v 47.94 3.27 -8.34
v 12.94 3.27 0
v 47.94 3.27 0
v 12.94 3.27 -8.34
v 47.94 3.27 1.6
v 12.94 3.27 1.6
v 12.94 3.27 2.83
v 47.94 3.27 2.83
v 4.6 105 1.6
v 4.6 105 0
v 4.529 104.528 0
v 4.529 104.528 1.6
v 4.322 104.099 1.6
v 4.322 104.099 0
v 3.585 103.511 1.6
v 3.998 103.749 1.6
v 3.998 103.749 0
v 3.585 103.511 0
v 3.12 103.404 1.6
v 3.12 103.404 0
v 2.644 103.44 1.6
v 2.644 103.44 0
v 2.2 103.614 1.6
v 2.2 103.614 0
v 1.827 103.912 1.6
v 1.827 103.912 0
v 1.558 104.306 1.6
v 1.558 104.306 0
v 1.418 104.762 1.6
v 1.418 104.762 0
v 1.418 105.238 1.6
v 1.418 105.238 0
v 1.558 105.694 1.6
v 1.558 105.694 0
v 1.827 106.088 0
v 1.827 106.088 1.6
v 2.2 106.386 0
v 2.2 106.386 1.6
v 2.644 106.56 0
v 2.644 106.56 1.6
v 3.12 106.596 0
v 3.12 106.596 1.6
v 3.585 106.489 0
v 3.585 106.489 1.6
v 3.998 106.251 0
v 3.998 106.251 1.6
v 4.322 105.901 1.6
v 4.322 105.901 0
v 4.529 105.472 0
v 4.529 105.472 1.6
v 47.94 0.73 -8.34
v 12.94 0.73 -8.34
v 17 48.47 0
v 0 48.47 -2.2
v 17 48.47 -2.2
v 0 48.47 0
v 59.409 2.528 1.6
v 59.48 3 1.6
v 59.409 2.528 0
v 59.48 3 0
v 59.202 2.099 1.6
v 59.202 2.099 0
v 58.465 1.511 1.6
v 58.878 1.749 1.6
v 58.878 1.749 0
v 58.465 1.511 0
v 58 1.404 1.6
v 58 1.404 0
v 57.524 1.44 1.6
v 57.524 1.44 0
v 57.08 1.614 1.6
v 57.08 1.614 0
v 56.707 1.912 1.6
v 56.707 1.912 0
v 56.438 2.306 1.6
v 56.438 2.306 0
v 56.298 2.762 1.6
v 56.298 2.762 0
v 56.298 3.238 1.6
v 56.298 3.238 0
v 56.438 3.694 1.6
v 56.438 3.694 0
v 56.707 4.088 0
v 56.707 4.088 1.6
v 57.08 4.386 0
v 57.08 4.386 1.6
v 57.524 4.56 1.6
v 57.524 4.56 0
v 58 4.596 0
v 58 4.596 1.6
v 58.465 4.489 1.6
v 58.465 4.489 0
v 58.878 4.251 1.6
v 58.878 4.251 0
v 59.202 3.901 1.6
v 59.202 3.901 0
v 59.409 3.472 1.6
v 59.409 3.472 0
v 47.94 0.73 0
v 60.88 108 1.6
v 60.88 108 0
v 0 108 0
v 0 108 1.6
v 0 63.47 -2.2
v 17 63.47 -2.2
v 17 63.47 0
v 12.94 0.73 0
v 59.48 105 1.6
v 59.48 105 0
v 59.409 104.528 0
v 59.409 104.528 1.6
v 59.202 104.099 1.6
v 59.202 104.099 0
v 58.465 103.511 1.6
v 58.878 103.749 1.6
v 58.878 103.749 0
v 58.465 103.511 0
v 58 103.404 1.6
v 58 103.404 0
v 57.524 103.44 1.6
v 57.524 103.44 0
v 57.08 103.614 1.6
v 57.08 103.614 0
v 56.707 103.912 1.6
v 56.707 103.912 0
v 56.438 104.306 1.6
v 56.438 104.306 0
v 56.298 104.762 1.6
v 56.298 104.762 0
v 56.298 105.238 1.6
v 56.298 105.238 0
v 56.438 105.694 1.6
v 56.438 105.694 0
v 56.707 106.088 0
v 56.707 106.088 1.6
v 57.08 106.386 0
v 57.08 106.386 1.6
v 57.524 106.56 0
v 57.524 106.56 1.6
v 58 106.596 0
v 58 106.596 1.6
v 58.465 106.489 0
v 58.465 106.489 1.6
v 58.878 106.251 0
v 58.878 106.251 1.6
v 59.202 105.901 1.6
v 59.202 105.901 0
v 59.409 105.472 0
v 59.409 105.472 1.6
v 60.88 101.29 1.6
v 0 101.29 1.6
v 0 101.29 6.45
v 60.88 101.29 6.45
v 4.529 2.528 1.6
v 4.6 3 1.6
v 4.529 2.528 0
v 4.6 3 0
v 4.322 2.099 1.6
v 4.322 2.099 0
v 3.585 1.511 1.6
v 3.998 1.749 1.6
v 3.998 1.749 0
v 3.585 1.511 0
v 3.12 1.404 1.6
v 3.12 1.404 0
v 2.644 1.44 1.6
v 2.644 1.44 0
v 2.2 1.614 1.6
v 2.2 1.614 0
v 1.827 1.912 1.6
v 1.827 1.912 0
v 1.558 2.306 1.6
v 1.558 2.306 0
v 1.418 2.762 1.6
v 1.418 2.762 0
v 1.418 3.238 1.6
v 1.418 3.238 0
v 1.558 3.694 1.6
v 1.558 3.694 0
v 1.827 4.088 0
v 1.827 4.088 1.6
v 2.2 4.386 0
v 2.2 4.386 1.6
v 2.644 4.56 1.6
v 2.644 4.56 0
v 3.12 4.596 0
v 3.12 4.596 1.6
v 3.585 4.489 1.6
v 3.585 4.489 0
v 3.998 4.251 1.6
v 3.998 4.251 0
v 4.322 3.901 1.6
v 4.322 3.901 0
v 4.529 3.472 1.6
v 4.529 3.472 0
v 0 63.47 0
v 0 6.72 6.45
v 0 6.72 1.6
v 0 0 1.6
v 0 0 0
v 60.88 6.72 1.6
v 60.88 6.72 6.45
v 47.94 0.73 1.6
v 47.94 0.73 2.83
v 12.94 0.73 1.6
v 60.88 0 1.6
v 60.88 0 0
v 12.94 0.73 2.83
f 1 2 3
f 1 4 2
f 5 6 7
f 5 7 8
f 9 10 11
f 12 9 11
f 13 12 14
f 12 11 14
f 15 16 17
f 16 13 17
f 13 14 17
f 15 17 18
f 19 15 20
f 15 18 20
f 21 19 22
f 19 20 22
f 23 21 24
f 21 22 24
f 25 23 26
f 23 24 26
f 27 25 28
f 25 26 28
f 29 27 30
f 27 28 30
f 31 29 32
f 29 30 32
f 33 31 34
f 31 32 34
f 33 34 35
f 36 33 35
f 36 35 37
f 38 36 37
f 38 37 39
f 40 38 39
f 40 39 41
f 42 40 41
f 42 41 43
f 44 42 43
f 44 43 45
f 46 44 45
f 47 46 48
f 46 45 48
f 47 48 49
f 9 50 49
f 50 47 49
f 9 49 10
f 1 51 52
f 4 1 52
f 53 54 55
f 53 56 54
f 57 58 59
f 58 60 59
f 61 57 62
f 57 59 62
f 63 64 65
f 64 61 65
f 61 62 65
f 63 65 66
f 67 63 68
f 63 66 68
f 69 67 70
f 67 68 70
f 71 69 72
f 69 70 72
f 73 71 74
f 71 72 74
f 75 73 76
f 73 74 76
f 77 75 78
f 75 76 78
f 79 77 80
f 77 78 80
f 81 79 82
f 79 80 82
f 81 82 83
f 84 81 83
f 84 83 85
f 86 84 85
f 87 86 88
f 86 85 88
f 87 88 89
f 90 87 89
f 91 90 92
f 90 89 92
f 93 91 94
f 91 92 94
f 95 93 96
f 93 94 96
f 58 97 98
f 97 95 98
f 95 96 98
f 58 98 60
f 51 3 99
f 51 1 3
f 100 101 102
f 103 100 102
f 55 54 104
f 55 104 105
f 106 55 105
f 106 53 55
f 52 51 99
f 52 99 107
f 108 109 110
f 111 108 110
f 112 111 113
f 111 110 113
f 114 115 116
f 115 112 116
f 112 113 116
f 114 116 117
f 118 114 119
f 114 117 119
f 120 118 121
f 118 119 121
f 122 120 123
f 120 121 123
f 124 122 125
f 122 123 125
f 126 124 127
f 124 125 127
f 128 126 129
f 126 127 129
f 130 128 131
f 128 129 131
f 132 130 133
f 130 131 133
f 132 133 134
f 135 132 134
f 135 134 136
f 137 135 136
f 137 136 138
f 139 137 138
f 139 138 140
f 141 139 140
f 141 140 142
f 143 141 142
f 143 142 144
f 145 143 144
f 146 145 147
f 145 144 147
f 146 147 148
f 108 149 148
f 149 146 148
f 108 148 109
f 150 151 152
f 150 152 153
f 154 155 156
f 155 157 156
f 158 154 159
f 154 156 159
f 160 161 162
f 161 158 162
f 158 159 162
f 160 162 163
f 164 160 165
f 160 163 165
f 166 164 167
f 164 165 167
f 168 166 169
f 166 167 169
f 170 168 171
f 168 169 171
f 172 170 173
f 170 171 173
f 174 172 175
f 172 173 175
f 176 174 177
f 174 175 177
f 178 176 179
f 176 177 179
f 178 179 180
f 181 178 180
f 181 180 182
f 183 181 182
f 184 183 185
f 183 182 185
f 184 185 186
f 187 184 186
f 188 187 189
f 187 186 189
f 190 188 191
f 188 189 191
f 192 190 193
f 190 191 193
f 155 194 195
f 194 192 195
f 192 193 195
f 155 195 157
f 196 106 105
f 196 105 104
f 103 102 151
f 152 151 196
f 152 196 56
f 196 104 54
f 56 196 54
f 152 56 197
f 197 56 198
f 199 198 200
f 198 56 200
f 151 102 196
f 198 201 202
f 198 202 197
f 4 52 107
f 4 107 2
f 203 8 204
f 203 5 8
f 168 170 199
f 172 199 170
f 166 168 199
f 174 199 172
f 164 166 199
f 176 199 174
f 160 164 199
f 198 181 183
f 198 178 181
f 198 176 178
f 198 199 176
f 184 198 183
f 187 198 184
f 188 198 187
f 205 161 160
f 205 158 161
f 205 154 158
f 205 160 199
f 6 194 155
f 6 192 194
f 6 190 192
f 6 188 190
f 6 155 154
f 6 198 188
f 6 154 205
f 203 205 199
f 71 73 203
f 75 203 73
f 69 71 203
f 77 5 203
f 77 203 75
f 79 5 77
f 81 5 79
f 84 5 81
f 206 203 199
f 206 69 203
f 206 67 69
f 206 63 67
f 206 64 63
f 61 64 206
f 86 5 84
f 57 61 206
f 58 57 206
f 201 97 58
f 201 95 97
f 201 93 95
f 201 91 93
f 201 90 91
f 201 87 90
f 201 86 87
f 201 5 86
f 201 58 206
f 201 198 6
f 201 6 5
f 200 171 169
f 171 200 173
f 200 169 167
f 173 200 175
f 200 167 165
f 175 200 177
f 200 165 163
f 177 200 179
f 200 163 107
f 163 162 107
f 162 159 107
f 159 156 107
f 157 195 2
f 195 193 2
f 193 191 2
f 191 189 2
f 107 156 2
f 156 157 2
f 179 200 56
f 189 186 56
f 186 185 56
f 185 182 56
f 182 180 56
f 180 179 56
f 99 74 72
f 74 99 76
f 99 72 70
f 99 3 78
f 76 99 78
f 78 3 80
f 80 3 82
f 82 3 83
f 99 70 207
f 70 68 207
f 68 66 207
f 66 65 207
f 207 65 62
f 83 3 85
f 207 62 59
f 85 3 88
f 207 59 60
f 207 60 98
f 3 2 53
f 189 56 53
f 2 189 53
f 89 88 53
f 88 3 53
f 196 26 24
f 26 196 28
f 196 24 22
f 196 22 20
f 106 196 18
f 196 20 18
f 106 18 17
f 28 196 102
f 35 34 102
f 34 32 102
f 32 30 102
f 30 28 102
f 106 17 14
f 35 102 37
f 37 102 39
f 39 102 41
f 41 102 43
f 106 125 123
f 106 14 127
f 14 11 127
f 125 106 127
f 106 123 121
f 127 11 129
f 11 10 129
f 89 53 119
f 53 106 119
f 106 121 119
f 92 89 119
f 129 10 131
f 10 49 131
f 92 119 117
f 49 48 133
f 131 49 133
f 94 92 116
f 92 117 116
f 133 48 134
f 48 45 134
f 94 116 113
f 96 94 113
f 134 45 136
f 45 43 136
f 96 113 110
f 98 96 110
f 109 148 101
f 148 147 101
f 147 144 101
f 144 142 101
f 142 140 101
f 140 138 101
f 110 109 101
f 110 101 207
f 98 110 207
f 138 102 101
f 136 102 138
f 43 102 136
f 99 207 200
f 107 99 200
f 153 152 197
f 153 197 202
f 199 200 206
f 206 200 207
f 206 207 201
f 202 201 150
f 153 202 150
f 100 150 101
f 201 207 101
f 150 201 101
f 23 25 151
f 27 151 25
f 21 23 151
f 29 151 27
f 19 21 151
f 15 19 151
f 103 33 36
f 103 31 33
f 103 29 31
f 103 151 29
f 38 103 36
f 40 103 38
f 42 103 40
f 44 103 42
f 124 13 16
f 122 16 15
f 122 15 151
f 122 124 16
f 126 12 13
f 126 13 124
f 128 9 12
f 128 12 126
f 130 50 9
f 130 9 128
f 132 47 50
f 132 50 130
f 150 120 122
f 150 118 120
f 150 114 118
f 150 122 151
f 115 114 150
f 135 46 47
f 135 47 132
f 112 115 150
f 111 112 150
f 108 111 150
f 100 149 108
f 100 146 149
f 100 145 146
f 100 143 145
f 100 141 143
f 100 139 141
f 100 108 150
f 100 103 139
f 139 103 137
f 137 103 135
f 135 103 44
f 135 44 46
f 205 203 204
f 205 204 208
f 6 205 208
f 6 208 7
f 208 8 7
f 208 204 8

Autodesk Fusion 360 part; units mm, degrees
sketch "Sketch1" plane through (0, 0, 0) normal (0, 0, 1) x (1, 0, 0)
  line L0 (0, 0) -> (60.88, 0)
  line L1 (60.88, 0) -> (60.88, 108)
  line L2 (60.88, 108) -> (0, 108)
  line L3 (0, 108) -> (0, 0)
  circle A0 centre (3, 3) radius 1.6
  circle A1 centre (57.88, 3) radius 1.6
  circle A2 centre (3, 105) radius 1.6
  circle A3 centre (57.88, 105) radius 1.6
  line L4 (0, 101.29) -> (60.88, 101.29)
  line L5 (60.88, 101.29) -> (60.88, 6.72)
  line L6 (60.88, 6.72) -> (0, 6.72)
  line L7 (0, 6.72) -> (0, 101.29)
  dimension "d1" = 60.88
  dimension "d2" = 108
  dimension "d3" = 3.2
  dimension "d6" = 54.88
  dimension "d7" = 102
  dimension "d8" = 3
  dimension "d9" = 3
  dimension "d10" = 60.88
  dimension "d11" = 94.57
  dimension "d12" = 6.71
extrude "Extrude1" add sketch "Sketch1" along normal blind 1.6 contours L0 L1 L3 L6 | L1 L2 L3 L4 makes body 1 at (39.32, 102.0648, 0) makes body 2 at (21.56, 5.9419, 0)
extrude "Extrude2" add sketch "Sketch1" along normal blind 6.45 contours L1 L3 L4 L5 L6 L7 bodies 1 2
sketch "Sketch2" plane through (0, 0, 0) normal (0, 0, -1) x (1, 0, 0)
  circle A0 centre (57.88, -3) radius 1.6
  circle A1 centre (3, -3) radius 1.6
  circle A2 centre (57.88, -105) radius 1.6
  circle A3 centre (3, -105) radius 1.6
  line L0 (0, 0) -> (0, -108)
  line L1 (0, -108) -> (60.88, -108)
  line L2 (60.88, -108) -> (60.88, 0)
  line L3 (60.88, 0) -> (0, 0)
  line L4 (17, -63.47) -> (0, -63.47)
  line L5 (0, -63.47) -> (0, -48.47)
  line L6 (0, -48.47) -> (17, -48.47)
  line L7 (17, -48.47) -> (17, -63.47)
  point P0 (0, -55.97)
  dimension "d18" = 17
  dimension "d19" = 15
  dimension "d20" = 52.03
extrude "Extrude3" add sketch "Sketch2" along normal blind 2.2 contours L0 L4 L5 L6 L7 bodies 1
sketch "Sketch3" plane through (0, 0, 1.6) normal (0, 0, 1) x (-1, 0, 0)
  circle A0 centre (-3, -3) radius 1.6
  circle A1 centre (-57.88, -3) radius 1.6
  line L0 (-60.88, -6.72) -> (0, -6.72)
  line L1 (0, -6.72) -> (0, 0)
  line L2 (0, 0) -> (-60.88, 0)
  line L3 (-60.88, 0) -> (-60.88, -6.72)
  line L4 (-12.94, -3.27) -> (-47.94, -3.27)
  line L5 (-47.94, -3.27) -> (-47.94, -0.73)
  line L6 (-47.94, -0.73) -> (-12.94, -0.73)
  line L7 (-12.94, -0.73) -> (-12.94, -3.27)
  point P0 (-30.44, -3.27)
  point P1 (-47.94, -2)
  point P2 (-30.44, 0)
  point P3 (-30.44, -0.73)
  dimension "d23" = 35
  dimension "d24" = 2.54
  dimension "d25" = 2
extrude "Extrude4" add sketch "Sketch3" along normal blind 1.23 and the other way blind 9.94 contours L4 L5 L6 L7 bodies 1
equation "d28 = 11.17 mm - 1.23 mm"
